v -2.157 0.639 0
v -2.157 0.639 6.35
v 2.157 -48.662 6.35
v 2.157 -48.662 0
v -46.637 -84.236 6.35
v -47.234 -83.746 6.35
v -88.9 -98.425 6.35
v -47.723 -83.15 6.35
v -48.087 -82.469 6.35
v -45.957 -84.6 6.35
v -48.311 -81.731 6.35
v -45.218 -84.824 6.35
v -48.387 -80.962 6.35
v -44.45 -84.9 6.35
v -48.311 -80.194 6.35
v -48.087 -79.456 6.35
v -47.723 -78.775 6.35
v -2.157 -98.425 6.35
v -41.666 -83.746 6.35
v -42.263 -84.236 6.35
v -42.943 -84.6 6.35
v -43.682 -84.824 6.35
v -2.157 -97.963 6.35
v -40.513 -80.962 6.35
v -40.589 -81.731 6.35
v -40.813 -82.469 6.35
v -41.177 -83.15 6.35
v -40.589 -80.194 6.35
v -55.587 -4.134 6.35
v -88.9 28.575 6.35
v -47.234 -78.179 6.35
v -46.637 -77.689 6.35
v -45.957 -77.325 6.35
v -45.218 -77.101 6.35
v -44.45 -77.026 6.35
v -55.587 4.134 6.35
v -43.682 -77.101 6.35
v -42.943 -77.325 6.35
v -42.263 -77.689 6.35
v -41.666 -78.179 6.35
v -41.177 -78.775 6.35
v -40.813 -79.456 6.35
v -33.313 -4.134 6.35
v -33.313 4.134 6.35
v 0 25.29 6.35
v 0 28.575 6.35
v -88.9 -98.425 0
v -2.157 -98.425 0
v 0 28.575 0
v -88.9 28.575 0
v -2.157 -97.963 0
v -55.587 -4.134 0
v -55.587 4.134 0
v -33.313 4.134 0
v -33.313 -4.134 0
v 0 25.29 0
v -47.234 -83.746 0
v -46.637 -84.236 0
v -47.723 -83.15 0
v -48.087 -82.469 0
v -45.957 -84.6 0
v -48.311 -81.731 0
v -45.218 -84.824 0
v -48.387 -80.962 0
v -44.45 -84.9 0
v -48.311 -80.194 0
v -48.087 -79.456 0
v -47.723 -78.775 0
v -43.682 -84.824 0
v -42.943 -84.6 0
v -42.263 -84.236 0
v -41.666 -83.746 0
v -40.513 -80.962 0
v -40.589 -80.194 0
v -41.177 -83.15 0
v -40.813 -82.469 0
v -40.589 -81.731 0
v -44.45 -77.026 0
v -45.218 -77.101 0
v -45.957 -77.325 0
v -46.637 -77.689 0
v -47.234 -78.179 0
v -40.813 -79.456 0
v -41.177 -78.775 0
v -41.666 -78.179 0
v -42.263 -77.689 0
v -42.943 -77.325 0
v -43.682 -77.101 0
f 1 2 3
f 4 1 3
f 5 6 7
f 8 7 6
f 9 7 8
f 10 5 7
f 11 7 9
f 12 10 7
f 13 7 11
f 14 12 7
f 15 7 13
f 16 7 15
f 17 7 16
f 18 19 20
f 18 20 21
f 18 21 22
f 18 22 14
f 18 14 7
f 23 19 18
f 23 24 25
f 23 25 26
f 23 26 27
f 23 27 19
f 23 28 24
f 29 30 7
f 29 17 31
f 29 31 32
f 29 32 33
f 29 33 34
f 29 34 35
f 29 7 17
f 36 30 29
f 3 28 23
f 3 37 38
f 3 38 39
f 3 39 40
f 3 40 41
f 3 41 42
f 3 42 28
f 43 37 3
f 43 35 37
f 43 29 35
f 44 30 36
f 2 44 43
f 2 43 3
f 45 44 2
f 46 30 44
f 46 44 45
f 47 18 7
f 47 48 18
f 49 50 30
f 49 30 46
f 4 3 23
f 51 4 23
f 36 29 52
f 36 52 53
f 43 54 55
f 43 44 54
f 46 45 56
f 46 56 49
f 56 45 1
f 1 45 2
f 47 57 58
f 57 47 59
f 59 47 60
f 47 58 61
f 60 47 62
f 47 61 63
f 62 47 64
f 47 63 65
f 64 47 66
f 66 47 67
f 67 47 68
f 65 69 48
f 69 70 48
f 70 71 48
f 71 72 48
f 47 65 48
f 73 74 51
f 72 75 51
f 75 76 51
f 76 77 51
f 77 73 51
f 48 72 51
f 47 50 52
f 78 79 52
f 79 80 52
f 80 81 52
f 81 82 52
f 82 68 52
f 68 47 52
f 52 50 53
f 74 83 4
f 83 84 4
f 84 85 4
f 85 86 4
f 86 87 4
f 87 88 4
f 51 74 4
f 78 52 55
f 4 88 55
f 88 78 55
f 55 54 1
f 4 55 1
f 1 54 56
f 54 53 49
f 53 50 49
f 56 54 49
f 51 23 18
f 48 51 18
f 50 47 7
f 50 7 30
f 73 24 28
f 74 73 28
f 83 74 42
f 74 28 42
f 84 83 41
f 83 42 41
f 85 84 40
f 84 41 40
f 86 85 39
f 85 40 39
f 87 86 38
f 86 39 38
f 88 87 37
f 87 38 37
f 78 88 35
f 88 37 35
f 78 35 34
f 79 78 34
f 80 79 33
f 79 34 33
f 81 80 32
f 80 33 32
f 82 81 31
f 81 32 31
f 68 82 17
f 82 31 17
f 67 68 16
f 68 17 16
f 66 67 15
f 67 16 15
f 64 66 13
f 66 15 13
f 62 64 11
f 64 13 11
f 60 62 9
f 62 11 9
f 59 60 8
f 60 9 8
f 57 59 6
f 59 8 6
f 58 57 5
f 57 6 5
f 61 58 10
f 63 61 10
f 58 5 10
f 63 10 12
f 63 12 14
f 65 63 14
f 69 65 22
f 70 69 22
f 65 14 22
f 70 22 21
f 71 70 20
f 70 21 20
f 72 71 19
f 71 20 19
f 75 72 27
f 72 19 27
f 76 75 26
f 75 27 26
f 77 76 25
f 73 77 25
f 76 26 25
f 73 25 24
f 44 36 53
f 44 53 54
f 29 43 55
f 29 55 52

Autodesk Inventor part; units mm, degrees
ref_plane "YZ Plane" through (0, 0, 0) normal (1, 0, 0) x (0, 1, 0)
ref_plane "XZ Plane" through (0, 0, 0) normal (0, 1, 0) x (-1, 0, 0)
ref_plane "XY Plane" through (0, 0, 0) normal (0, 0, 1) x (1, 0, 0)
ref_plane "Work Plane1" through (0, 0, 0) normal (0, 0, 1) x (1, 0, 0)
sketch "Sketch1" plane through (0, 0, 0) normal (0, 0, 1) x (1, 0, 0)
  line L0 (88.9, -98.425) -> (-88.9, -98.425)
  line L1 (-88.9, -98.425) -> (-88.9, -28.575)
  line L2 (-88.9, -28.575) -> (-88.9, 28.575)
  line L3 (-88.9, 28.575) -> (-85.09, 28.575)
  line L4 (88.9, 28.575) -> (88.9, -28.575)
  line L5 (85.09, 28.575) -> (88.9, 28.575)
  line L6 (88.9, -28.575) -> (88.9, -98.425)
  line L7 (-88.9, 28.575) -> (88.9, 28.575)
  line L8 (88.9, 28.575) -> (88.9, -98.425)
  line L9 (88.9, -98.425) -> (-88.9, -98.425)
  line L10 (-88.9, -98.425) -> (-88.9, 28.575)
  point P0 (0, 0)
extrude "Extrusion1" add sketch "Sketch1" along normal blind 6.35
sketch "Sketch2" plane through (0, 0, 6.35) normal (0, 0, 1) x (1, 0, 0)
  line L0 (-88.9, -98.425) -> (88.9, -98.425) projected
  line L1 (-88.9, -98.425) -> (-88.9, -28.575)
  line L2 (-88.9, 28.575) -> (-88.9, -98.425) projected
  line L3 (88.9, -98.425) -> (88.9, 28.575) projected
  circle A0 centre (-44.45, -80.9625) radius 3.937
  line L4 (-88.9, 28.575) -> (88.9, 28.575)
  line L5 (88.9, 28.575) -> (88.9, -28.575)
  line L6 (88.9, -28.575) -> (-88.9, -28.575)
  line L7 (-88.9, -28.575) -> (-88.9, 28.575)
  line L8 (88.9, 28.575) -> (-88.9, 28.575) projected
  line L9 (0, 28.575) -> (0, -28.575)
  line L10 (-66.675, -80.9625) -> (-44.45, -80.9625)
  line L11 (-55.5874, 4.1336) -> (-33.3126, 4.1336)
  line L12 (-33.3126, 4.1336) -> (-33.3126, -4.1336)
  line L13 (-33.3126, -4.1336) -> (-55.5874, -4.1336)
  line L14 (-55.5874, -4.1336) -> (-55.5874, 4.1336)
  line L15 (-55.5874, 4.1336) -> (-33.3126, -4.1336) construction
  line L16 (-33.3126, 4.1336) -> (-55.5874, -4.1336) construction
  line L17 (34.2724, -7.1205) -> (54.0224, -7.1205)
  line L18 (54.0224, -7.1205) -> (54.0224, -24.7205)
  line L19 (54.0224, -24.7205) -> (34.2724, -24.7205)
  line L20 (34.2724, -24.7205) -> (34.2724, -7.1205)
  line L21 (34.2724, -7.1205) -> (54.0224, -24.7205) construction
  line L22 (54.0224, -7.1205) -> (34.2724, -24.7205) construction
  line L23 (39.3724, 16.9458) -> (54.0224, 16.9458)
  line L24 (54.0224, 16.9458) -> (54.0224, 0.4458)
  line L25 (54.0224, 0.4458) -> (39.3724, 0.4458)
  line L26 (39.3724, 0.4458) -> (39.3724, 16.9458)
  line L27 (39.3724, 16.9458) -> (54.0224, 0.4458) construction
  line L28 (54.0224, 16.9458) -> (39.3724, 0.4458) construction
  point P0 (0, 0)
  point P1 (44.1474, -15.9205)
  point P2 (46.6974, 8.6958)
  dimension "d2" = 69.85
  dimension "d5" = 7.874
  dimension "d8" = 22.2748
  dimension "d9" = 8.2672
  dimension "d10" = 16.5
  dimension "d11" = 14.65
  dimension "d12" = 19.75
  dimension "d13" = 17.6
extrude "Extrusion2" cut sketch "Sketch2" against normal through all contours A0 | L11 L12 L13 L14 | L17 L18 L19 L20 | L23 L24 L25 L26
sketch "Sketch3" plane through (0, 0, 6.35) normal (0, 0, 1) x (1, 0, 0)
  line L0 (88.9, 28.575) -> (-88.9, 28.575) projected
  line L1 (-88.9, -98.425) -> (88.9, -98.425) projected
  line L2 (-88.9, -98.425) -> (88.9, -98.425) projected
  line L3 (0, 25.29) -> (30.48, 25.29) construction
  line L4 (0, 25.29) -> (-2.1566, 0.6394)
  line L5 (0, 25.29) -> (24.7447, 25.29) construction
  line L6 (-2.1566, 0.6394) -> (0, -24.0111)
  line L7 (0, -24.0111) -> (2.1566, -48.6616)
  line L8 (2.1566, -48.6616) -> (0, -73.3121)
  line L9 (0, -73.3121) -> (-2.1566, -97.9626)
  line L10 (0, 25.29) -> (0, 28.575)
  line L11 (-2.1566, -97.9626) -> (-2.1566, -98.425)
  line L12 (-88.9, 28.575) -> (-88.9, -98.425) projected
  line L13 (-33.3126, -4.1336) -> (-55.5874, -4.1336) projected
  line L14 (-55.5874, -4.1336) -> (-55.5874, 4.1336) projected
  line L15 (-55.5874, 4.1336) -> (-33.3126, 4.1336) projected
  line L16 (-33.3126, 4.1336) -> (-33.3126, -4.1336) projected
  line L17 (54.0224, -7.1205) -> (54.0224, -24.7205) projected
  line L18 (54.0224, -24.7205) -> (34.2724, -24.7205) projected
  line L19 (34.2724, -24.7205) -> (34.2724, -7.1205) projected
  line L20 (34.2724, -7.1205) -> (54.0224, -7.1205) projected
  circle A0 centre (-44.45, -80.9625) radius 3.937 projected
  line L21 (39.3724, 0.4458) -> (39.3724, 16.9458) projected
  line L22 (39.3724, 16.9458) -> (54.0224, 16.9458) projected
  line L23 (54.0224, 16.9458) -> (54.0224, 0.4458) projected
  line L24 (54.0224, 0.4458) -> (39.3724, 0.4458) projected
  line L25 (88.9, 28.575) -> (-88.9, 28.575) projected
  line L26 (-88.9, 28.575) -> (-88.9, -98.425) projected
  line L27 (-88.9, -98.425) -> (88.9, -98.425) projected
  line L28 (88.9, -98.425) -> (88.9, 28.575) projected
  point P0 (0, 0)
  dimension "d21" = 24.7447
  dimension "d22" = 95
  dimension "d23" = 24.7447
  dimension "d24" = 24.7447
  dimension "d25" = 180
  dimension "d26" = 24.7447
  dimension "d27" = 24.7447
extrude "Extrusion5" cut sketch "Sketch3" against normal blind 25.4 contours L28 L1 L11 L9 L8 L7 L6 L4 L10 L0
properties part number "compnent box front L"
